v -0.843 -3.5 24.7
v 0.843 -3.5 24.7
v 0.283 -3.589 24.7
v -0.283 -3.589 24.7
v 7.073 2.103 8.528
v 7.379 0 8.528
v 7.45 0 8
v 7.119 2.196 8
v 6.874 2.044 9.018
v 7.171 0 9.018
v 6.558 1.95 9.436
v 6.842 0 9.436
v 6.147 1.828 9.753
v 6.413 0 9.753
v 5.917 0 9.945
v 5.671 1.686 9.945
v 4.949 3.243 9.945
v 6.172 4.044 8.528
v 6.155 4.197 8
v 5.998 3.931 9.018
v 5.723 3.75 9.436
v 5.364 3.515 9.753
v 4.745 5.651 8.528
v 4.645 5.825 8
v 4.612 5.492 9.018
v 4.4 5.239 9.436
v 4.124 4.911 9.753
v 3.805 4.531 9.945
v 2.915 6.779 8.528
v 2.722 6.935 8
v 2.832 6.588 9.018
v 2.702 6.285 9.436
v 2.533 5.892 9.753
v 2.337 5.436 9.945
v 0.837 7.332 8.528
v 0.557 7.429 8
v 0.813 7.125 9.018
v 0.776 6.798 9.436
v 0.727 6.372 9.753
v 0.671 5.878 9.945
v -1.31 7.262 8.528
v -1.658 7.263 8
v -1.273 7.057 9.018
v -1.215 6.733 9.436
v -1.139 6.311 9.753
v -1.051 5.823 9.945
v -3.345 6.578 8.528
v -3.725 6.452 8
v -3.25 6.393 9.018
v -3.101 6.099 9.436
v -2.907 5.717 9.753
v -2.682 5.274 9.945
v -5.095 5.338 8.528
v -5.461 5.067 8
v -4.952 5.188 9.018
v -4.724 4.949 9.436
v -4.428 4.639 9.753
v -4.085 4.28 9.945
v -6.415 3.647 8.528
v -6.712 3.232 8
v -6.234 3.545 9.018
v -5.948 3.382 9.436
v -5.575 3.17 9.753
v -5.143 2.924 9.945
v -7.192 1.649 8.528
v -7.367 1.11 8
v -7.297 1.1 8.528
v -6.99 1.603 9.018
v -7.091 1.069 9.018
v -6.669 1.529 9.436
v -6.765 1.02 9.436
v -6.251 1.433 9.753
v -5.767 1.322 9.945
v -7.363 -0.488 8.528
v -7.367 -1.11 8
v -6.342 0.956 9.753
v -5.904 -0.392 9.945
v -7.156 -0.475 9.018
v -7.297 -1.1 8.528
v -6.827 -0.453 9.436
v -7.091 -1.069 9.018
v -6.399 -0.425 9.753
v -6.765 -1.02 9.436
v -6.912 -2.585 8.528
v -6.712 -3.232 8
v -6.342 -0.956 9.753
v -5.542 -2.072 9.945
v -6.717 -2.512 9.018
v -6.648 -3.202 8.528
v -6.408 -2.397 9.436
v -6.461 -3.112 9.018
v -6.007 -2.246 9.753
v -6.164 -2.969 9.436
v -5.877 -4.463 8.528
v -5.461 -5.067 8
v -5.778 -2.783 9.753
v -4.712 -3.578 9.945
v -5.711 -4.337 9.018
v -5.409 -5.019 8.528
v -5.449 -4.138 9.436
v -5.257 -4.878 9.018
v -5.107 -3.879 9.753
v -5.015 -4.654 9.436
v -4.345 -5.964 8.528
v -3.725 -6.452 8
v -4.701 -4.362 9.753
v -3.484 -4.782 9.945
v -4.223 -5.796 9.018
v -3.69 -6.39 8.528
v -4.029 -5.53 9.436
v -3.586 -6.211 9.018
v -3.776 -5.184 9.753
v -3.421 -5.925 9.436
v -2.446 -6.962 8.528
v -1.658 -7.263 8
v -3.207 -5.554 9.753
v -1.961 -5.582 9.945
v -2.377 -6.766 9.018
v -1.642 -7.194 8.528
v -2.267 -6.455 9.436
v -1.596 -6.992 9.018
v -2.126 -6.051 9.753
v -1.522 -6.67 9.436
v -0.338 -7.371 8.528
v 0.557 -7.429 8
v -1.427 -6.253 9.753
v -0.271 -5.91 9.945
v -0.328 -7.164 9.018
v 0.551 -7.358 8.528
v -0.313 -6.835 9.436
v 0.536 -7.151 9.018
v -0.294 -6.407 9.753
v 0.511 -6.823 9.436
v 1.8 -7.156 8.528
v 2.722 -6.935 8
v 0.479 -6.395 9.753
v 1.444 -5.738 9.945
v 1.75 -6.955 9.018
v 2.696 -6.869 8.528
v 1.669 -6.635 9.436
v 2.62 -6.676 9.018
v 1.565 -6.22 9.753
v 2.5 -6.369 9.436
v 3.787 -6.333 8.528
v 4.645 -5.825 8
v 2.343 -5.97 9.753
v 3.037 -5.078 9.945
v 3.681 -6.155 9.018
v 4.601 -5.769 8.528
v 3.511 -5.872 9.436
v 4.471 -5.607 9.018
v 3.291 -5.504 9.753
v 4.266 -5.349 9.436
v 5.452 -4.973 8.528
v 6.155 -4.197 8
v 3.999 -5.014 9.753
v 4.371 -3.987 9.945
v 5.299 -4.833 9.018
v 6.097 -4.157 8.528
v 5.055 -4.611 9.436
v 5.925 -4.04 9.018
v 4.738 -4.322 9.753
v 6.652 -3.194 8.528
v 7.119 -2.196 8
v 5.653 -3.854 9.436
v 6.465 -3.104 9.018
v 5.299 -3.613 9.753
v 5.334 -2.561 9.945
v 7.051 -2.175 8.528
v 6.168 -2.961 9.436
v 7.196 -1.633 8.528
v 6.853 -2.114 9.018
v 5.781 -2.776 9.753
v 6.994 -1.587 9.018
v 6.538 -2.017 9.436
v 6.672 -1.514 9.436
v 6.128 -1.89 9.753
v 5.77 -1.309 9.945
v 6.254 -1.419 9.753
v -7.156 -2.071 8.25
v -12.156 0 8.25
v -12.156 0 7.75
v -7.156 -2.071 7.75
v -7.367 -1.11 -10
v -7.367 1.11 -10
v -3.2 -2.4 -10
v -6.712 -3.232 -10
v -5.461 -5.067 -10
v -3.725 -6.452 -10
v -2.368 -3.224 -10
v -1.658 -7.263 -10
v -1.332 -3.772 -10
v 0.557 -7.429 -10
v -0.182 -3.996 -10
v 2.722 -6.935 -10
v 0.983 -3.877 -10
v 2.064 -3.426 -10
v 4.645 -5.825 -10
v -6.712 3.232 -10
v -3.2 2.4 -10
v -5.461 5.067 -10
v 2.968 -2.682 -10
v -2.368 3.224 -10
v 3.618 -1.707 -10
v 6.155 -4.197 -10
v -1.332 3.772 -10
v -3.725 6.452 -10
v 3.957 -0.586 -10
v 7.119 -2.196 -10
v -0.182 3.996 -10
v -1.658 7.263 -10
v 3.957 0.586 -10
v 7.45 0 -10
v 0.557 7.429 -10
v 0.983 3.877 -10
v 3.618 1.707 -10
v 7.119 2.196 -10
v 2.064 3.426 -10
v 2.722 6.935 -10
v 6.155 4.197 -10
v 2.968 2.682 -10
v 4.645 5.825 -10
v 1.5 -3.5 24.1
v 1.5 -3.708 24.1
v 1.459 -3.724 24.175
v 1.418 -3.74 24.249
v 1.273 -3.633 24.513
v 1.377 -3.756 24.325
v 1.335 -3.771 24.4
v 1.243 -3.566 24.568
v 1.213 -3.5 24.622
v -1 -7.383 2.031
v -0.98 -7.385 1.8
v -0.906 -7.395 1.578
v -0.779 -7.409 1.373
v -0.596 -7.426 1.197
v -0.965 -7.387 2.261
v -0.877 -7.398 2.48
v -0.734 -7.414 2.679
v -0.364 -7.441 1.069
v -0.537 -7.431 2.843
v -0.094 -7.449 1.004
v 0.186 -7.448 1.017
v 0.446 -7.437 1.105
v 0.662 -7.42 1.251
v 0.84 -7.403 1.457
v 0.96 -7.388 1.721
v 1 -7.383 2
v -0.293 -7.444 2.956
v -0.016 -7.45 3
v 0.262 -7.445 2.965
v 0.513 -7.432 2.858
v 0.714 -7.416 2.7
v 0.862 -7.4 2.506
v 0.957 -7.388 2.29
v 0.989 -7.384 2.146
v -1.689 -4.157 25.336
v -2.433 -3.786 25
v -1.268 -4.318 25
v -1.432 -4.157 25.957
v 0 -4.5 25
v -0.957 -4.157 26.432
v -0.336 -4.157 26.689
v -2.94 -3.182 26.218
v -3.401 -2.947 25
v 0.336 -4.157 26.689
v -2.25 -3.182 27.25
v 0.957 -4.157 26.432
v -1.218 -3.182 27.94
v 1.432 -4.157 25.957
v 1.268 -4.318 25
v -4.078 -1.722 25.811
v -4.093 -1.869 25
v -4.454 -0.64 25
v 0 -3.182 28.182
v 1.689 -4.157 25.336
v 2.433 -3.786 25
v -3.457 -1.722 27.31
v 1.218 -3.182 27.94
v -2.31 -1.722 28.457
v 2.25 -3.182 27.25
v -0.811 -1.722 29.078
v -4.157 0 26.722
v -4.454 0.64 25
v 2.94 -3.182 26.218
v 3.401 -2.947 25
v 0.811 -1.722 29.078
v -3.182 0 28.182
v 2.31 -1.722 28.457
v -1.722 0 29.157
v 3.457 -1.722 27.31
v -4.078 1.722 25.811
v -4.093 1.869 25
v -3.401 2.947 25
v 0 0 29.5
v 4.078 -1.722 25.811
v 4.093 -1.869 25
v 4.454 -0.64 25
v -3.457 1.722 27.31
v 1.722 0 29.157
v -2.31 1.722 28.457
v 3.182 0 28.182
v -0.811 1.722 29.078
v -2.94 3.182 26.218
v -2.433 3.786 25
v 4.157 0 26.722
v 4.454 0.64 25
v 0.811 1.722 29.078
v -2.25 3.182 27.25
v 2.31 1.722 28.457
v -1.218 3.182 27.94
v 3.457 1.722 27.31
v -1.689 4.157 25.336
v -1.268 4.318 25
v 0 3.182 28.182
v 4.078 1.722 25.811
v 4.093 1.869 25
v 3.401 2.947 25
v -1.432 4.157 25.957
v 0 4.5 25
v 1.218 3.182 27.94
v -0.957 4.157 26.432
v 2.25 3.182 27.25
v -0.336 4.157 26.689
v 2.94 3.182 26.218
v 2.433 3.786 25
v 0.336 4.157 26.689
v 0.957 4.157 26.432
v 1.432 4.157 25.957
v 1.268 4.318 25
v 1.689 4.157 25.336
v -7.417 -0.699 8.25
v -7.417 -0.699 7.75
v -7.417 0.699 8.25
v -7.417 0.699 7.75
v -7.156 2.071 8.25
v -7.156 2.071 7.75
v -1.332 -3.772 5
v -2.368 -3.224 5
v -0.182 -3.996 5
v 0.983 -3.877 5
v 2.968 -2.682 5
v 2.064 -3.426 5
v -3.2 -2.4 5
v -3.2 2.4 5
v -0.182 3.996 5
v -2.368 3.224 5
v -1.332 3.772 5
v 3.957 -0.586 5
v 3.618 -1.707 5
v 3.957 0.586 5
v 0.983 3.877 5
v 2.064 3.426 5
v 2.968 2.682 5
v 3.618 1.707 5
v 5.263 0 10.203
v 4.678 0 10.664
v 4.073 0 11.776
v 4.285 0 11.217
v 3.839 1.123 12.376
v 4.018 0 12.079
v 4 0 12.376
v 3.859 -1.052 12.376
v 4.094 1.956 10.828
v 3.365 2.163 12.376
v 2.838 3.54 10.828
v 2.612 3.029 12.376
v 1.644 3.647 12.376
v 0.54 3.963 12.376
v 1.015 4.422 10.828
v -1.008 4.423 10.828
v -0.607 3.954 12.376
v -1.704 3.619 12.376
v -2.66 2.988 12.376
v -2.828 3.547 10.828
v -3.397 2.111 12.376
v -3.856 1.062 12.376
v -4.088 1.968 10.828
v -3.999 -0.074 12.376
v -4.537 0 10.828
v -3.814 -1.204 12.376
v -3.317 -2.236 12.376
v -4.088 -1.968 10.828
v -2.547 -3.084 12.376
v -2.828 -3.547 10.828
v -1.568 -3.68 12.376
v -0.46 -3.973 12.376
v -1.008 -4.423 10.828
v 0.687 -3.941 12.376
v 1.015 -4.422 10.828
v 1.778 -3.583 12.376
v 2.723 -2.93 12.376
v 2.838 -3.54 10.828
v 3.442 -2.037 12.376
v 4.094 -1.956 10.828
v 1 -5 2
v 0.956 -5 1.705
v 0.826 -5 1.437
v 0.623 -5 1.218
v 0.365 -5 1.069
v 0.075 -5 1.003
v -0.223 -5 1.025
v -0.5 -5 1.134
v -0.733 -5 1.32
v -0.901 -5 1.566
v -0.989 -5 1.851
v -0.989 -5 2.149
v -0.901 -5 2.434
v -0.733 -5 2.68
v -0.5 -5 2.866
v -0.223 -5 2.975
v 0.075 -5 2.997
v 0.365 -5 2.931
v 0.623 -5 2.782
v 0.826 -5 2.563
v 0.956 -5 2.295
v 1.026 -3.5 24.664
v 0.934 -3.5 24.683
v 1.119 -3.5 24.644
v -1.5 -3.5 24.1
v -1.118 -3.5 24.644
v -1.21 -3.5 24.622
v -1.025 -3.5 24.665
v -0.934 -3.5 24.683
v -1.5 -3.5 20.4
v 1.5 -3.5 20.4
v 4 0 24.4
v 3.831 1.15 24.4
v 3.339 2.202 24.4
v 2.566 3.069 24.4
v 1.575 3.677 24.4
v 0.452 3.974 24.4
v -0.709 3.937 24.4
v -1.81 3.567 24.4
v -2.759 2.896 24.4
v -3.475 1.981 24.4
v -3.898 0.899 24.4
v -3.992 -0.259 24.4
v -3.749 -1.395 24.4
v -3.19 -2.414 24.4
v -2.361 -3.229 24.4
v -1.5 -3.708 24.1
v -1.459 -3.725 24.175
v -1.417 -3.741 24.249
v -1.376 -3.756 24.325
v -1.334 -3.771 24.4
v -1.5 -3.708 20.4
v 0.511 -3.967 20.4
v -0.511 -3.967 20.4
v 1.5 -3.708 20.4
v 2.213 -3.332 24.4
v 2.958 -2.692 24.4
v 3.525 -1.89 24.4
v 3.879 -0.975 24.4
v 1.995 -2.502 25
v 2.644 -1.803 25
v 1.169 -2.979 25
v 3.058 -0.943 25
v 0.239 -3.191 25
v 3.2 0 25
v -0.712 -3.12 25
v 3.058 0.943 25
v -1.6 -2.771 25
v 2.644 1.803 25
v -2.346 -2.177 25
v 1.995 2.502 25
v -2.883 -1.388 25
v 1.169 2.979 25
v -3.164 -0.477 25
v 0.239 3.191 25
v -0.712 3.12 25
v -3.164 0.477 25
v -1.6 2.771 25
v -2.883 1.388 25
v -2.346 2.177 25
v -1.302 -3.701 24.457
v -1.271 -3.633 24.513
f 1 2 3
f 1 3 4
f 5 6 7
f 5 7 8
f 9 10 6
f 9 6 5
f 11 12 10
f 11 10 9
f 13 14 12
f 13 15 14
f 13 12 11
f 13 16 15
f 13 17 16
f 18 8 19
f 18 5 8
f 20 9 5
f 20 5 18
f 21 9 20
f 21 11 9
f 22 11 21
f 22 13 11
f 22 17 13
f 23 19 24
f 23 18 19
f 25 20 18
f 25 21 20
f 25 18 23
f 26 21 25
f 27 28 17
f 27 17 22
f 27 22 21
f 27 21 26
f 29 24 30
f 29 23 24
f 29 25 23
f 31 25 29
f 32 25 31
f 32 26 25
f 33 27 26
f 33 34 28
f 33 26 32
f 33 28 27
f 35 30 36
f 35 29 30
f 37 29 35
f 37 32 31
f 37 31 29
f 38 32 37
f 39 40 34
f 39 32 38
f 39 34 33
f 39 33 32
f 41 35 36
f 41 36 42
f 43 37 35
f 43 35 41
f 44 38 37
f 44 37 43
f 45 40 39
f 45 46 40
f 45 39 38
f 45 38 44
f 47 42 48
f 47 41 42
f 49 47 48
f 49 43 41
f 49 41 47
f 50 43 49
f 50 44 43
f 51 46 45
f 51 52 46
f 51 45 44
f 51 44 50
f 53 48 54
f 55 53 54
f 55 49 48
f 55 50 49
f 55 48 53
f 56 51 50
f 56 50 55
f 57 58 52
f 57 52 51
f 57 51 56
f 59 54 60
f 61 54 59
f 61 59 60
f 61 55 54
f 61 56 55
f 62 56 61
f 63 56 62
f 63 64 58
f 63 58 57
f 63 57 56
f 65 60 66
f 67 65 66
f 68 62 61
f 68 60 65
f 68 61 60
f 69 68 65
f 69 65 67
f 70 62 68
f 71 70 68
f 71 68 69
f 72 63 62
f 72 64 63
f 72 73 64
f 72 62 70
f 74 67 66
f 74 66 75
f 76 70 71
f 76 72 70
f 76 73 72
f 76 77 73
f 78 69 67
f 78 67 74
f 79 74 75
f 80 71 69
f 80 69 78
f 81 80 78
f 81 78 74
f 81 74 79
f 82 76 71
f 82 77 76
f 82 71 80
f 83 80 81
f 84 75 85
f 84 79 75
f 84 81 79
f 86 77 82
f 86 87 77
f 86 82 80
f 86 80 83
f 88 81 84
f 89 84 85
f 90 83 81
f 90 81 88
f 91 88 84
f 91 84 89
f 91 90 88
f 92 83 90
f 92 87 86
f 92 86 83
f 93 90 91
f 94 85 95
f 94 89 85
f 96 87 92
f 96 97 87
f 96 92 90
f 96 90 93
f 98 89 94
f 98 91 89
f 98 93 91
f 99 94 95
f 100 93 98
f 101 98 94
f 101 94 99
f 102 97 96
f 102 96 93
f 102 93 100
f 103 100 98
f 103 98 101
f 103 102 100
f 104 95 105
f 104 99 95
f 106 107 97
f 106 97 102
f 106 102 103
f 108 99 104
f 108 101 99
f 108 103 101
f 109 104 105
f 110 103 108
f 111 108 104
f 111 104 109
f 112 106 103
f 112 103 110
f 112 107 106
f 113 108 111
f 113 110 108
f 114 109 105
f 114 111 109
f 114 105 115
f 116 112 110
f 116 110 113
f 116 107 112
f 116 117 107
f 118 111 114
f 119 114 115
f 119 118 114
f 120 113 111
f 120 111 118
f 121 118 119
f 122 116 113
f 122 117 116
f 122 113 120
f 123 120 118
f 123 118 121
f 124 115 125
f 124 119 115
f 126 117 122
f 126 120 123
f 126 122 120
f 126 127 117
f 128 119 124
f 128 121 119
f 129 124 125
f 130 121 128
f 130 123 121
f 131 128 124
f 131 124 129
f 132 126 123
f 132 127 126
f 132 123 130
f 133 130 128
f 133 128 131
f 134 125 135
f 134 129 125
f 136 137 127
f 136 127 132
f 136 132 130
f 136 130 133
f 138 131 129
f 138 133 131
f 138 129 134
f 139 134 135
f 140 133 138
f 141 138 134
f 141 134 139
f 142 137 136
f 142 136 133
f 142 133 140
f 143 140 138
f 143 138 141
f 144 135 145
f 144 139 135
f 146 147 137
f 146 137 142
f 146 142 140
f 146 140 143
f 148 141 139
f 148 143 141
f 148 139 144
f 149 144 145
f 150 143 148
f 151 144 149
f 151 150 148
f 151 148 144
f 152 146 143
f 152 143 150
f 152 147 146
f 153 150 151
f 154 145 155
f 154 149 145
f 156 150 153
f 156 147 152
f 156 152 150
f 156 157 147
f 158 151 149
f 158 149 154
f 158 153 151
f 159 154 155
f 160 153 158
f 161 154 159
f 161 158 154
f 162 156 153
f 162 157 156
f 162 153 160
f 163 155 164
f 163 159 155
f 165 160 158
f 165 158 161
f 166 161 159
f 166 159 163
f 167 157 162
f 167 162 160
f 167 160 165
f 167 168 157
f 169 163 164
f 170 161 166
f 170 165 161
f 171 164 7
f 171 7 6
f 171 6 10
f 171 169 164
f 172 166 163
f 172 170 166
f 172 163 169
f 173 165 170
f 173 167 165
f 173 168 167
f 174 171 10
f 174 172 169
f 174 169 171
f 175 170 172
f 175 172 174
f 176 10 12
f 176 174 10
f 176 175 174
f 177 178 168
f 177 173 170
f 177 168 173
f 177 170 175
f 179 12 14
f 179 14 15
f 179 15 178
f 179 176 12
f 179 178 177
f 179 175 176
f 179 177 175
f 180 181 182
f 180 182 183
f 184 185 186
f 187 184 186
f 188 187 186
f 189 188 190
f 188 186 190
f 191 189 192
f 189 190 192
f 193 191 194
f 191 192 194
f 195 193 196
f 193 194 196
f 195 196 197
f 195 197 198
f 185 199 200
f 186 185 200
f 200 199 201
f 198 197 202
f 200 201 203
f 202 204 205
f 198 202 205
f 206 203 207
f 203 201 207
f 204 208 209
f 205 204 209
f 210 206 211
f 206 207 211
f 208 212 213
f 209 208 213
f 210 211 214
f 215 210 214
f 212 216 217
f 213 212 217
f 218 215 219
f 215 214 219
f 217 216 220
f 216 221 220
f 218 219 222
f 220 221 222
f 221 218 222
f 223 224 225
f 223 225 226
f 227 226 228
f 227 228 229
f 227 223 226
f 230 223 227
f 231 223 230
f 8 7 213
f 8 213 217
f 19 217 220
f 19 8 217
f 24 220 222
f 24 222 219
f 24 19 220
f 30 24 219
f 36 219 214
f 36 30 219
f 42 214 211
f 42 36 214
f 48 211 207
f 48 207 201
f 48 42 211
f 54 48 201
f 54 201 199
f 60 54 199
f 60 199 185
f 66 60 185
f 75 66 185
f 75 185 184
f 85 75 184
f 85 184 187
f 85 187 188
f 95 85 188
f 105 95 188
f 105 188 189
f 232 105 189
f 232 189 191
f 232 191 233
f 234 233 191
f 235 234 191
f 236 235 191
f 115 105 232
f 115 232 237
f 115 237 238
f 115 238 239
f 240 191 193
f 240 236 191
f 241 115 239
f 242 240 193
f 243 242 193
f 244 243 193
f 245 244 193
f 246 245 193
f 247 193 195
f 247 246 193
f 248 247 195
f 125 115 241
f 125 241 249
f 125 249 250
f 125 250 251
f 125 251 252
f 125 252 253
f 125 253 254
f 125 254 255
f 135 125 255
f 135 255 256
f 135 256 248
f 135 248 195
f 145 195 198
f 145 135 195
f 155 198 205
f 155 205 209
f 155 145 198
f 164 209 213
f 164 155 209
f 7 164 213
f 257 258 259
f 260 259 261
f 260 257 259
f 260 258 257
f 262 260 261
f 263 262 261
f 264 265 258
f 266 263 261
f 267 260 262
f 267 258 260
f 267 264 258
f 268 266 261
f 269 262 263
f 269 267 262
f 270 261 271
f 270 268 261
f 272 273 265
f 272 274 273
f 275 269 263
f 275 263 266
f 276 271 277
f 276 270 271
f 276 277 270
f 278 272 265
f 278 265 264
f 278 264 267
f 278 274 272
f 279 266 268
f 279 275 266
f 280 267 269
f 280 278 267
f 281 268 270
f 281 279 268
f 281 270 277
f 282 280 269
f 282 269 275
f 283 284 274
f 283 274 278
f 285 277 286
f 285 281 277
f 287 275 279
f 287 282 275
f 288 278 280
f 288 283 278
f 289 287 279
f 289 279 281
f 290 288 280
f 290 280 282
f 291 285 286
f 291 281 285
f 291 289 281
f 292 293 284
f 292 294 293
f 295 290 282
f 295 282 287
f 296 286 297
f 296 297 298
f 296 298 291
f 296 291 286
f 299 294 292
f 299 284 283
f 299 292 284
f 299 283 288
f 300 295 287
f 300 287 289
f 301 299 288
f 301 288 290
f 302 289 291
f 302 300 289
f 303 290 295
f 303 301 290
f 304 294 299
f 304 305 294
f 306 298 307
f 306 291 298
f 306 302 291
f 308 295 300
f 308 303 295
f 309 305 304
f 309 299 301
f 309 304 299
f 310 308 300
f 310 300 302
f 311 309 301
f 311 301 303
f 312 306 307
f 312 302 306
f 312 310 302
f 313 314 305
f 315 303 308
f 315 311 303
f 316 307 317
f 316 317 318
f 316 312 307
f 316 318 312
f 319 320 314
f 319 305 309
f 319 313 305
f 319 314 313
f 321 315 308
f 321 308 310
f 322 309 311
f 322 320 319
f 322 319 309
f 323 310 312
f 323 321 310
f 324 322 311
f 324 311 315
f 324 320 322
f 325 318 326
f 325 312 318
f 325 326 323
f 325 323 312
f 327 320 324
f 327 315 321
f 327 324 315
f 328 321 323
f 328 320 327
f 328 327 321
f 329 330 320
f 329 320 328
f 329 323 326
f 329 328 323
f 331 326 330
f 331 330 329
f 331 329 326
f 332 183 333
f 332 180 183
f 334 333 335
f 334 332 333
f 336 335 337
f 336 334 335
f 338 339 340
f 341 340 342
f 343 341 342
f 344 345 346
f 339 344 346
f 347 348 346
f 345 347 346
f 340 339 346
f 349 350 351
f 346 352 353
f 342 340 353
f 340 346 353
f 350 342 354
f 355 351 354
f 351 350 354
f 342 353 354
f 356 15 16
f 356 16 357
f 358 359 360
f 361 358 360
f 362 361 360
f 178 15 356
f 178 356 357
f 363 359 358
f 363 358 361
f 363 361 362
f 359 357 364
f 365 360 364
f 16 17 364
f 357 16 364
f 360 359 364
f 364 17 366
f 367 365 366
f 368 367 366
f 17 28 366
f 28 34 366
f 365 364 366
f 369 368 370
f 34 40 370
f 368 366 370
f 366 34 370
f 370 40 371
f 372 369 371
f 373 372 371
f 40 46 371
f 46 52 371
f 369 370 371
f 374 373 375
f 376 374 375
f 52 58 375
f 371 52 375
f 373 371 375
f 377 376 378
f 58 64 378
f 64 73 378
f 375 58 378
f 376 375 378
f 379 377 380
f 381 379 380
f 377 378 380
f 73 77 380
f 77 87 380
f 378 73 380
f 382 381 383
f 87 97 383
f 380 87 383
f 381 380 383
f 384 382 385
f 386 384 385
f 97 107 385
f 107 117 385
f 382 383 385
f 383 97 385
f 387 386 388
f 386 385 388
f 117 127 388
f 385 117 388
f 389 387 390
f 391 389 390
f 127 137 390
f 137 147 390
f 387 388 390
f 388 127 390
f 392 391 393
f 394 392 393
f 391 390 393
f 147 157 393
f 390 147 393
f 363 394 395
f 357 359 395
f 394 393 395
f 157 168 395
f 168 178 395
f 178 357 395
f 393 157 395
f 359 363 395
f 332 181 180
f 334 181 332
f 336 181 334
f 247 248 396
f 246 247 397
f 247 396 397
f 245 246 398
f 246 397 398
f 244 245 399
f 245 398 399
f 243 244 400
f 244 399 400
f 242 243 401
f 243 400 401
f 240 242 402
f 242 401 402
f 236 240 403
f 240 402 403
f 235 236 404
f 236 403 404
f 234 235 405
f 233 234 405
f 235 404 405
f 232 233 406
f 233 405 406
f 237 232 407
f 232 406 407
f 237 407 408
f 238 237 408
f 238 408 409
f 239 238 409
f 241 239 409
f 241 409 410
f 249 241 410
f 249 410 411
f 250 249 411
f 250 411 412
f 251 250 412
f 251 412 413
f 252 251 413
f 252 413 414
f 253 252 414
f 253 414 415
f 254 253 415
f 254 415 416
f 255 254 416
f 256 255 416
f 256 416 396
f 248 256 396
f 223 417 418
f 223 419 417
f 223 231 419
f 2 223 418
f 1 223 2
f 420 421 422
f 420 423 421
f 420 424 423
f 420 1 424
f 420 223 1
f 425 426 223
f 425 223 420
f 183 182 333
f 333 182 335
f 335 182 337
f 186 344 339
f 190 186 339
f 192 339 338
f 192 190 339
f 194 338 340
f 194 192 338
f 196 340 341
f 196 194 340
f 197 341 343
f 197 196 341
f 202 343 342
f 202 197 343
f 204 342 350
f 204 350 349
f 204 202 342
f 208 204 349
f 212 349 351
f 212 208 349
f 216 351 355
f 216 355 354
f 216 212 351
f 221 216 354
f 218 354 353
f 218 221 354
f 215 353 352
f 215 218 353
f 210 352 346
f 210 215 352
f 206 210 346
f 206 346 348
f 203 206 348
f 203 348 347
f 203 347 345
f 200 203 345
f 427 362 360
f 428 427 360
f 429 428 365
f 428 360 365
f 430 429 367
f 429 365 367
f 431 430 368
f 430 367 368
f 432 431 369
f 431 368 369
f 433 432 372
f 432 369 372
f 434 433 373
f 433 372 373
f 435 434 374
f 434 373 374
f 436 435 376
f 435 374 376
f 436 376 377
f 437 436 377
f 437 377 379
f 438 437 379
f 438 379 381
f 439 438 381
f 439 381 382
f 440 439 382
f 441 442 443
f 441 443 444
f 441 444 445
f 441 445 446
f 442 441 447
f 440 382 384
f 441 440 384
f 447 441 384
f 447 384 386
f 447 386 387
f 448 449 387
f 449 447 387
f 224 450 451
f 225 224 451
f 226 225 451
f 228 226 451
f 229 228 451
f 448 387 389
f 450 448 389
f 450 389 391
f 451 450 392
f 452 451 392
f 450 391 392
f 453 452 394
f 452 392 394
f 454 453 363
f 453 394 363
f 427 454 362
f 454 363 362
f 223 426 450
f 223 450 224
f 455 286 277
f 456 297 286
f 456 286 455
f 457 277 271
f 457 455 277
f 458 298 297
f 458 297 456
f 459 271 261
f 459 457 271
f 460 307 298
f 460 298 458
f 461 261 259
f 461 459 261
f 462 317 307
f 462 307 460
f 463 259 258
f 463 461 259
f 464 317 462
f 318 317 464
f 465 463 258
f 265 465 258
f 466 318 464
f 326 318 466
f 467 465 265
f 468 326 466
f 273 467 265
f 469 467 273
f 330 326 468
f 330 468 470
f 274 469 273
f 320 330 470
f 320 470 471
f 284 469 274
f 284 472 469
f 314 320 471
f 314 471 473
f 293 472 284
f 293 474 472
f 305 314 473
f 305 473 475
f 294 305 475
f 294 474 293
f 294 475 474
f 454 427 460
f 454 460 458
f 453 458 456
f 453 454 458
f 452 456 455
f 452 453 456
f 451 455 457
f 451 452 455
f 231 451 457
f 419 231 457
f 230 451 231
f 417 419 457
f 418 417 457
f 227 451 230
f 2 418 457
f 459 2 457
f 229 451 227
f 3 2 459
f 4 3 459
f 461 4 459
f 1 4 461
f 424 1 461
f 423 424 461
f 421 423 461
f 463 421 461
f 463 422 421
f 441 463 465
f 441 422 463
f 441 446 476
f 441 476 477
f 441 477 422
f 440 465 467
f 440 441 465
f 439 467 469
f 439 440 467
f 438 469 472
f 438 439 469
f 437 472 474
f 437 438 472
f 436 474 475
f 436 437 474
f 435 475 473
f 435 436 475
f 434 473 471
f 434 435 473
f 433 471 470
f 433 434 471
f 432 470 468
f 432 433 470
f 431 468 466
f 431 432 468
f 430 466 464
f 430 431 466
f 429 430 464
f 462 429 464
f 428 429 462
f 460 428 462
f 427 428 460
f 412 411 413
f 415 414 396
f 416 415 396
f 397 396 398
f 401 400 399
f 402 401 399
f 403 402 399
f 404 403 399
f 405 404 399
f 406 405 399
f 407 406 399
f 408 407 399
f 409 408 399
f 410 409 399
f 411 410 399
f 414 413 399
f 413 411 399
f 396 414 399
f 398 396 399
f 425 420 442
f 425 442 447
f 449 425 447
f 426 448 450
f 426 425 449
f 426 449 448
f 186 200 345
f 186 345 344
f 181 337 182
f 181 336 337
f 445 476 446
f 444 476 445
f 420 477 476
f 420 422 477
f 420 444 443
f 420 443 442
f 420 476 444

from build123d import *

# Parameters (mm, degrees)
SKETCH2_R           = 7.45
BOSS_EXTRUDE1_DEPTH = 10
SKETCH3_R           = 4
BOSS_EXTRUDE2_DEPTH = 15
FILLET7_R           = 2
FILLET12_R          = 2.5
REVOLVE1_ANGLE      = 180
CUT_EXTRUDE4_START  = -3.5
CUT_EXTRUDE4_DEPTH  = 1
CUT_EXTRUDE5_START  = -5
SKETCH20_R          = 1
CUT_EXTRUDE5_DEPTH  = 5
BOSS_EXTRUDE3_DEPTH = 0.25
CUT_EXTRUDE6_DEPTH  = 15


with BuildPart() as part:
    # Sketch2 → Boss-Extrude1 (new body, symmetric)
    with BuildSketch(Plane.XY):
        Circle(SKETCH2_R)
    extrude(amount=BOSS_EXTRUDE1_DEPTH, both=True)

    # Sketch3 → Boss-Extrude2 (add)
    with BuildSketch(Plane.XY.offset(10)):
        Circle(SKETCH3_R)
    extrude(amount=BOSS_EXTRUDE2_DEPTH)

    # Fillet7
    fillet7_edges = [part.edges().sort_by_distance(p)[0] for p in [
        (-7.45, 0, 10),
    ]]
    fillet(fillet7_edges, radius=FILLET7_R)

    # Fillet12
    fillet12_edges = [part.edges().sort_by_distance(p)[0] for p in [
        (-4, 0, 10),
    ]]
    fillet(fillet12_edges, radius=FILLET12_R)

    # Sketch4 → Revolve1 (revolve)
    with BuildSketch(Plane.XY.offset(25)):
        with BuildLine():
            Line((0, 4.5), (0, -4.5))
            ThreePointArc((0, -4.5), (-4.5, 0), (0, 4.5))
        make_face()
    revolve(axis=Axis((0, 4.5, 25), (0, 1, 0)), revolution_arc=REVOLVE1_ANGLE)

    # Sketch18 → Cut-Revolve18 (revolve, cut)
    with BuildSketch(Plane(origin=(0, 0, 0), x_dir=(1, 0, 0), z_dir=(0, 1, 0))):
        Polygon((4, -25), (3.2, -25), (4, -24.4), align=None)
    revolve(axis=Axis((0, 0, 22.4216759), (0, 0, -1)), mode=Mode.SUBTRACT)

    # Sketch19 → Cut-Extrude4 (cut)
    with BuildSketch(Plane(origin=(0, 0, 0), x_dir=(1, 0, 0), z_dir=(0, 1, 0)).offset(CUT_EXTRUDE4_START)):
        Polygon((-1.5, -24.1), (-1.5, -20.4), (1.5, -20.4), (1.5, -24.1), (1.17, -24.7), (-1.167506704, -24.7), align=None)
    extrude(amount=-CUT_EXTRUDE4_DEPTH, mode=Mode.SUBTRACT)

    # Sketch20 → Cut-Extrude5 (cut)
    with BuildSketch(Plane(origin=(0, 0, 0), x_dir=(1, 0, 0), z_dir=(0, 1, 0)).offset(CUT_EXTRUDE5_START)):
        with Locations((0, -2)):
            Circle(SKETCH20_R)
    extrude(amount=-CUT_EXTRUDE5_DEPTH, mode=Mode.SUBTRACT)

    # Sketch26 → Cut-Extrude6 (cut)
    with BuildSketch(Plane(origin=(0, 0, -10), x_dir=(-1, 0, 0), z_dir=(0, 0, -1))):
        with BuildLine():
            Line((3.2, 2.4), (3.2, -2.4))
            ThreePointArc((3.2, -2.4), (-4, 0), (3.2, 2.4))
        make_face()
    extrude(amount=-CUT_EXTRUDE6_DEPTH, mode=Mode.SUBTRACT)


with BuildPart() as body_2:
    # Sketch24 → Boss-Extrude3 (new body, symmetric)
    with BuildSketch(Plane.XY.offset(8)):
        with BuildLine():
            Line((-7.156338318, 2.071067812), (-12.156338318, 0))
            Line((-12.156338318, 0), (-7.156338318, -2.071067812))
            ThreePointArc((-7.156338318, -2.071067812), (-7.45, 0), (-7.156338318, 2.071067812))
        make_face()
    extrude(amount=BOSS_EXTRUDE3_DEPTH, both=True)


solid = Compound([part.part, body_2.part])
